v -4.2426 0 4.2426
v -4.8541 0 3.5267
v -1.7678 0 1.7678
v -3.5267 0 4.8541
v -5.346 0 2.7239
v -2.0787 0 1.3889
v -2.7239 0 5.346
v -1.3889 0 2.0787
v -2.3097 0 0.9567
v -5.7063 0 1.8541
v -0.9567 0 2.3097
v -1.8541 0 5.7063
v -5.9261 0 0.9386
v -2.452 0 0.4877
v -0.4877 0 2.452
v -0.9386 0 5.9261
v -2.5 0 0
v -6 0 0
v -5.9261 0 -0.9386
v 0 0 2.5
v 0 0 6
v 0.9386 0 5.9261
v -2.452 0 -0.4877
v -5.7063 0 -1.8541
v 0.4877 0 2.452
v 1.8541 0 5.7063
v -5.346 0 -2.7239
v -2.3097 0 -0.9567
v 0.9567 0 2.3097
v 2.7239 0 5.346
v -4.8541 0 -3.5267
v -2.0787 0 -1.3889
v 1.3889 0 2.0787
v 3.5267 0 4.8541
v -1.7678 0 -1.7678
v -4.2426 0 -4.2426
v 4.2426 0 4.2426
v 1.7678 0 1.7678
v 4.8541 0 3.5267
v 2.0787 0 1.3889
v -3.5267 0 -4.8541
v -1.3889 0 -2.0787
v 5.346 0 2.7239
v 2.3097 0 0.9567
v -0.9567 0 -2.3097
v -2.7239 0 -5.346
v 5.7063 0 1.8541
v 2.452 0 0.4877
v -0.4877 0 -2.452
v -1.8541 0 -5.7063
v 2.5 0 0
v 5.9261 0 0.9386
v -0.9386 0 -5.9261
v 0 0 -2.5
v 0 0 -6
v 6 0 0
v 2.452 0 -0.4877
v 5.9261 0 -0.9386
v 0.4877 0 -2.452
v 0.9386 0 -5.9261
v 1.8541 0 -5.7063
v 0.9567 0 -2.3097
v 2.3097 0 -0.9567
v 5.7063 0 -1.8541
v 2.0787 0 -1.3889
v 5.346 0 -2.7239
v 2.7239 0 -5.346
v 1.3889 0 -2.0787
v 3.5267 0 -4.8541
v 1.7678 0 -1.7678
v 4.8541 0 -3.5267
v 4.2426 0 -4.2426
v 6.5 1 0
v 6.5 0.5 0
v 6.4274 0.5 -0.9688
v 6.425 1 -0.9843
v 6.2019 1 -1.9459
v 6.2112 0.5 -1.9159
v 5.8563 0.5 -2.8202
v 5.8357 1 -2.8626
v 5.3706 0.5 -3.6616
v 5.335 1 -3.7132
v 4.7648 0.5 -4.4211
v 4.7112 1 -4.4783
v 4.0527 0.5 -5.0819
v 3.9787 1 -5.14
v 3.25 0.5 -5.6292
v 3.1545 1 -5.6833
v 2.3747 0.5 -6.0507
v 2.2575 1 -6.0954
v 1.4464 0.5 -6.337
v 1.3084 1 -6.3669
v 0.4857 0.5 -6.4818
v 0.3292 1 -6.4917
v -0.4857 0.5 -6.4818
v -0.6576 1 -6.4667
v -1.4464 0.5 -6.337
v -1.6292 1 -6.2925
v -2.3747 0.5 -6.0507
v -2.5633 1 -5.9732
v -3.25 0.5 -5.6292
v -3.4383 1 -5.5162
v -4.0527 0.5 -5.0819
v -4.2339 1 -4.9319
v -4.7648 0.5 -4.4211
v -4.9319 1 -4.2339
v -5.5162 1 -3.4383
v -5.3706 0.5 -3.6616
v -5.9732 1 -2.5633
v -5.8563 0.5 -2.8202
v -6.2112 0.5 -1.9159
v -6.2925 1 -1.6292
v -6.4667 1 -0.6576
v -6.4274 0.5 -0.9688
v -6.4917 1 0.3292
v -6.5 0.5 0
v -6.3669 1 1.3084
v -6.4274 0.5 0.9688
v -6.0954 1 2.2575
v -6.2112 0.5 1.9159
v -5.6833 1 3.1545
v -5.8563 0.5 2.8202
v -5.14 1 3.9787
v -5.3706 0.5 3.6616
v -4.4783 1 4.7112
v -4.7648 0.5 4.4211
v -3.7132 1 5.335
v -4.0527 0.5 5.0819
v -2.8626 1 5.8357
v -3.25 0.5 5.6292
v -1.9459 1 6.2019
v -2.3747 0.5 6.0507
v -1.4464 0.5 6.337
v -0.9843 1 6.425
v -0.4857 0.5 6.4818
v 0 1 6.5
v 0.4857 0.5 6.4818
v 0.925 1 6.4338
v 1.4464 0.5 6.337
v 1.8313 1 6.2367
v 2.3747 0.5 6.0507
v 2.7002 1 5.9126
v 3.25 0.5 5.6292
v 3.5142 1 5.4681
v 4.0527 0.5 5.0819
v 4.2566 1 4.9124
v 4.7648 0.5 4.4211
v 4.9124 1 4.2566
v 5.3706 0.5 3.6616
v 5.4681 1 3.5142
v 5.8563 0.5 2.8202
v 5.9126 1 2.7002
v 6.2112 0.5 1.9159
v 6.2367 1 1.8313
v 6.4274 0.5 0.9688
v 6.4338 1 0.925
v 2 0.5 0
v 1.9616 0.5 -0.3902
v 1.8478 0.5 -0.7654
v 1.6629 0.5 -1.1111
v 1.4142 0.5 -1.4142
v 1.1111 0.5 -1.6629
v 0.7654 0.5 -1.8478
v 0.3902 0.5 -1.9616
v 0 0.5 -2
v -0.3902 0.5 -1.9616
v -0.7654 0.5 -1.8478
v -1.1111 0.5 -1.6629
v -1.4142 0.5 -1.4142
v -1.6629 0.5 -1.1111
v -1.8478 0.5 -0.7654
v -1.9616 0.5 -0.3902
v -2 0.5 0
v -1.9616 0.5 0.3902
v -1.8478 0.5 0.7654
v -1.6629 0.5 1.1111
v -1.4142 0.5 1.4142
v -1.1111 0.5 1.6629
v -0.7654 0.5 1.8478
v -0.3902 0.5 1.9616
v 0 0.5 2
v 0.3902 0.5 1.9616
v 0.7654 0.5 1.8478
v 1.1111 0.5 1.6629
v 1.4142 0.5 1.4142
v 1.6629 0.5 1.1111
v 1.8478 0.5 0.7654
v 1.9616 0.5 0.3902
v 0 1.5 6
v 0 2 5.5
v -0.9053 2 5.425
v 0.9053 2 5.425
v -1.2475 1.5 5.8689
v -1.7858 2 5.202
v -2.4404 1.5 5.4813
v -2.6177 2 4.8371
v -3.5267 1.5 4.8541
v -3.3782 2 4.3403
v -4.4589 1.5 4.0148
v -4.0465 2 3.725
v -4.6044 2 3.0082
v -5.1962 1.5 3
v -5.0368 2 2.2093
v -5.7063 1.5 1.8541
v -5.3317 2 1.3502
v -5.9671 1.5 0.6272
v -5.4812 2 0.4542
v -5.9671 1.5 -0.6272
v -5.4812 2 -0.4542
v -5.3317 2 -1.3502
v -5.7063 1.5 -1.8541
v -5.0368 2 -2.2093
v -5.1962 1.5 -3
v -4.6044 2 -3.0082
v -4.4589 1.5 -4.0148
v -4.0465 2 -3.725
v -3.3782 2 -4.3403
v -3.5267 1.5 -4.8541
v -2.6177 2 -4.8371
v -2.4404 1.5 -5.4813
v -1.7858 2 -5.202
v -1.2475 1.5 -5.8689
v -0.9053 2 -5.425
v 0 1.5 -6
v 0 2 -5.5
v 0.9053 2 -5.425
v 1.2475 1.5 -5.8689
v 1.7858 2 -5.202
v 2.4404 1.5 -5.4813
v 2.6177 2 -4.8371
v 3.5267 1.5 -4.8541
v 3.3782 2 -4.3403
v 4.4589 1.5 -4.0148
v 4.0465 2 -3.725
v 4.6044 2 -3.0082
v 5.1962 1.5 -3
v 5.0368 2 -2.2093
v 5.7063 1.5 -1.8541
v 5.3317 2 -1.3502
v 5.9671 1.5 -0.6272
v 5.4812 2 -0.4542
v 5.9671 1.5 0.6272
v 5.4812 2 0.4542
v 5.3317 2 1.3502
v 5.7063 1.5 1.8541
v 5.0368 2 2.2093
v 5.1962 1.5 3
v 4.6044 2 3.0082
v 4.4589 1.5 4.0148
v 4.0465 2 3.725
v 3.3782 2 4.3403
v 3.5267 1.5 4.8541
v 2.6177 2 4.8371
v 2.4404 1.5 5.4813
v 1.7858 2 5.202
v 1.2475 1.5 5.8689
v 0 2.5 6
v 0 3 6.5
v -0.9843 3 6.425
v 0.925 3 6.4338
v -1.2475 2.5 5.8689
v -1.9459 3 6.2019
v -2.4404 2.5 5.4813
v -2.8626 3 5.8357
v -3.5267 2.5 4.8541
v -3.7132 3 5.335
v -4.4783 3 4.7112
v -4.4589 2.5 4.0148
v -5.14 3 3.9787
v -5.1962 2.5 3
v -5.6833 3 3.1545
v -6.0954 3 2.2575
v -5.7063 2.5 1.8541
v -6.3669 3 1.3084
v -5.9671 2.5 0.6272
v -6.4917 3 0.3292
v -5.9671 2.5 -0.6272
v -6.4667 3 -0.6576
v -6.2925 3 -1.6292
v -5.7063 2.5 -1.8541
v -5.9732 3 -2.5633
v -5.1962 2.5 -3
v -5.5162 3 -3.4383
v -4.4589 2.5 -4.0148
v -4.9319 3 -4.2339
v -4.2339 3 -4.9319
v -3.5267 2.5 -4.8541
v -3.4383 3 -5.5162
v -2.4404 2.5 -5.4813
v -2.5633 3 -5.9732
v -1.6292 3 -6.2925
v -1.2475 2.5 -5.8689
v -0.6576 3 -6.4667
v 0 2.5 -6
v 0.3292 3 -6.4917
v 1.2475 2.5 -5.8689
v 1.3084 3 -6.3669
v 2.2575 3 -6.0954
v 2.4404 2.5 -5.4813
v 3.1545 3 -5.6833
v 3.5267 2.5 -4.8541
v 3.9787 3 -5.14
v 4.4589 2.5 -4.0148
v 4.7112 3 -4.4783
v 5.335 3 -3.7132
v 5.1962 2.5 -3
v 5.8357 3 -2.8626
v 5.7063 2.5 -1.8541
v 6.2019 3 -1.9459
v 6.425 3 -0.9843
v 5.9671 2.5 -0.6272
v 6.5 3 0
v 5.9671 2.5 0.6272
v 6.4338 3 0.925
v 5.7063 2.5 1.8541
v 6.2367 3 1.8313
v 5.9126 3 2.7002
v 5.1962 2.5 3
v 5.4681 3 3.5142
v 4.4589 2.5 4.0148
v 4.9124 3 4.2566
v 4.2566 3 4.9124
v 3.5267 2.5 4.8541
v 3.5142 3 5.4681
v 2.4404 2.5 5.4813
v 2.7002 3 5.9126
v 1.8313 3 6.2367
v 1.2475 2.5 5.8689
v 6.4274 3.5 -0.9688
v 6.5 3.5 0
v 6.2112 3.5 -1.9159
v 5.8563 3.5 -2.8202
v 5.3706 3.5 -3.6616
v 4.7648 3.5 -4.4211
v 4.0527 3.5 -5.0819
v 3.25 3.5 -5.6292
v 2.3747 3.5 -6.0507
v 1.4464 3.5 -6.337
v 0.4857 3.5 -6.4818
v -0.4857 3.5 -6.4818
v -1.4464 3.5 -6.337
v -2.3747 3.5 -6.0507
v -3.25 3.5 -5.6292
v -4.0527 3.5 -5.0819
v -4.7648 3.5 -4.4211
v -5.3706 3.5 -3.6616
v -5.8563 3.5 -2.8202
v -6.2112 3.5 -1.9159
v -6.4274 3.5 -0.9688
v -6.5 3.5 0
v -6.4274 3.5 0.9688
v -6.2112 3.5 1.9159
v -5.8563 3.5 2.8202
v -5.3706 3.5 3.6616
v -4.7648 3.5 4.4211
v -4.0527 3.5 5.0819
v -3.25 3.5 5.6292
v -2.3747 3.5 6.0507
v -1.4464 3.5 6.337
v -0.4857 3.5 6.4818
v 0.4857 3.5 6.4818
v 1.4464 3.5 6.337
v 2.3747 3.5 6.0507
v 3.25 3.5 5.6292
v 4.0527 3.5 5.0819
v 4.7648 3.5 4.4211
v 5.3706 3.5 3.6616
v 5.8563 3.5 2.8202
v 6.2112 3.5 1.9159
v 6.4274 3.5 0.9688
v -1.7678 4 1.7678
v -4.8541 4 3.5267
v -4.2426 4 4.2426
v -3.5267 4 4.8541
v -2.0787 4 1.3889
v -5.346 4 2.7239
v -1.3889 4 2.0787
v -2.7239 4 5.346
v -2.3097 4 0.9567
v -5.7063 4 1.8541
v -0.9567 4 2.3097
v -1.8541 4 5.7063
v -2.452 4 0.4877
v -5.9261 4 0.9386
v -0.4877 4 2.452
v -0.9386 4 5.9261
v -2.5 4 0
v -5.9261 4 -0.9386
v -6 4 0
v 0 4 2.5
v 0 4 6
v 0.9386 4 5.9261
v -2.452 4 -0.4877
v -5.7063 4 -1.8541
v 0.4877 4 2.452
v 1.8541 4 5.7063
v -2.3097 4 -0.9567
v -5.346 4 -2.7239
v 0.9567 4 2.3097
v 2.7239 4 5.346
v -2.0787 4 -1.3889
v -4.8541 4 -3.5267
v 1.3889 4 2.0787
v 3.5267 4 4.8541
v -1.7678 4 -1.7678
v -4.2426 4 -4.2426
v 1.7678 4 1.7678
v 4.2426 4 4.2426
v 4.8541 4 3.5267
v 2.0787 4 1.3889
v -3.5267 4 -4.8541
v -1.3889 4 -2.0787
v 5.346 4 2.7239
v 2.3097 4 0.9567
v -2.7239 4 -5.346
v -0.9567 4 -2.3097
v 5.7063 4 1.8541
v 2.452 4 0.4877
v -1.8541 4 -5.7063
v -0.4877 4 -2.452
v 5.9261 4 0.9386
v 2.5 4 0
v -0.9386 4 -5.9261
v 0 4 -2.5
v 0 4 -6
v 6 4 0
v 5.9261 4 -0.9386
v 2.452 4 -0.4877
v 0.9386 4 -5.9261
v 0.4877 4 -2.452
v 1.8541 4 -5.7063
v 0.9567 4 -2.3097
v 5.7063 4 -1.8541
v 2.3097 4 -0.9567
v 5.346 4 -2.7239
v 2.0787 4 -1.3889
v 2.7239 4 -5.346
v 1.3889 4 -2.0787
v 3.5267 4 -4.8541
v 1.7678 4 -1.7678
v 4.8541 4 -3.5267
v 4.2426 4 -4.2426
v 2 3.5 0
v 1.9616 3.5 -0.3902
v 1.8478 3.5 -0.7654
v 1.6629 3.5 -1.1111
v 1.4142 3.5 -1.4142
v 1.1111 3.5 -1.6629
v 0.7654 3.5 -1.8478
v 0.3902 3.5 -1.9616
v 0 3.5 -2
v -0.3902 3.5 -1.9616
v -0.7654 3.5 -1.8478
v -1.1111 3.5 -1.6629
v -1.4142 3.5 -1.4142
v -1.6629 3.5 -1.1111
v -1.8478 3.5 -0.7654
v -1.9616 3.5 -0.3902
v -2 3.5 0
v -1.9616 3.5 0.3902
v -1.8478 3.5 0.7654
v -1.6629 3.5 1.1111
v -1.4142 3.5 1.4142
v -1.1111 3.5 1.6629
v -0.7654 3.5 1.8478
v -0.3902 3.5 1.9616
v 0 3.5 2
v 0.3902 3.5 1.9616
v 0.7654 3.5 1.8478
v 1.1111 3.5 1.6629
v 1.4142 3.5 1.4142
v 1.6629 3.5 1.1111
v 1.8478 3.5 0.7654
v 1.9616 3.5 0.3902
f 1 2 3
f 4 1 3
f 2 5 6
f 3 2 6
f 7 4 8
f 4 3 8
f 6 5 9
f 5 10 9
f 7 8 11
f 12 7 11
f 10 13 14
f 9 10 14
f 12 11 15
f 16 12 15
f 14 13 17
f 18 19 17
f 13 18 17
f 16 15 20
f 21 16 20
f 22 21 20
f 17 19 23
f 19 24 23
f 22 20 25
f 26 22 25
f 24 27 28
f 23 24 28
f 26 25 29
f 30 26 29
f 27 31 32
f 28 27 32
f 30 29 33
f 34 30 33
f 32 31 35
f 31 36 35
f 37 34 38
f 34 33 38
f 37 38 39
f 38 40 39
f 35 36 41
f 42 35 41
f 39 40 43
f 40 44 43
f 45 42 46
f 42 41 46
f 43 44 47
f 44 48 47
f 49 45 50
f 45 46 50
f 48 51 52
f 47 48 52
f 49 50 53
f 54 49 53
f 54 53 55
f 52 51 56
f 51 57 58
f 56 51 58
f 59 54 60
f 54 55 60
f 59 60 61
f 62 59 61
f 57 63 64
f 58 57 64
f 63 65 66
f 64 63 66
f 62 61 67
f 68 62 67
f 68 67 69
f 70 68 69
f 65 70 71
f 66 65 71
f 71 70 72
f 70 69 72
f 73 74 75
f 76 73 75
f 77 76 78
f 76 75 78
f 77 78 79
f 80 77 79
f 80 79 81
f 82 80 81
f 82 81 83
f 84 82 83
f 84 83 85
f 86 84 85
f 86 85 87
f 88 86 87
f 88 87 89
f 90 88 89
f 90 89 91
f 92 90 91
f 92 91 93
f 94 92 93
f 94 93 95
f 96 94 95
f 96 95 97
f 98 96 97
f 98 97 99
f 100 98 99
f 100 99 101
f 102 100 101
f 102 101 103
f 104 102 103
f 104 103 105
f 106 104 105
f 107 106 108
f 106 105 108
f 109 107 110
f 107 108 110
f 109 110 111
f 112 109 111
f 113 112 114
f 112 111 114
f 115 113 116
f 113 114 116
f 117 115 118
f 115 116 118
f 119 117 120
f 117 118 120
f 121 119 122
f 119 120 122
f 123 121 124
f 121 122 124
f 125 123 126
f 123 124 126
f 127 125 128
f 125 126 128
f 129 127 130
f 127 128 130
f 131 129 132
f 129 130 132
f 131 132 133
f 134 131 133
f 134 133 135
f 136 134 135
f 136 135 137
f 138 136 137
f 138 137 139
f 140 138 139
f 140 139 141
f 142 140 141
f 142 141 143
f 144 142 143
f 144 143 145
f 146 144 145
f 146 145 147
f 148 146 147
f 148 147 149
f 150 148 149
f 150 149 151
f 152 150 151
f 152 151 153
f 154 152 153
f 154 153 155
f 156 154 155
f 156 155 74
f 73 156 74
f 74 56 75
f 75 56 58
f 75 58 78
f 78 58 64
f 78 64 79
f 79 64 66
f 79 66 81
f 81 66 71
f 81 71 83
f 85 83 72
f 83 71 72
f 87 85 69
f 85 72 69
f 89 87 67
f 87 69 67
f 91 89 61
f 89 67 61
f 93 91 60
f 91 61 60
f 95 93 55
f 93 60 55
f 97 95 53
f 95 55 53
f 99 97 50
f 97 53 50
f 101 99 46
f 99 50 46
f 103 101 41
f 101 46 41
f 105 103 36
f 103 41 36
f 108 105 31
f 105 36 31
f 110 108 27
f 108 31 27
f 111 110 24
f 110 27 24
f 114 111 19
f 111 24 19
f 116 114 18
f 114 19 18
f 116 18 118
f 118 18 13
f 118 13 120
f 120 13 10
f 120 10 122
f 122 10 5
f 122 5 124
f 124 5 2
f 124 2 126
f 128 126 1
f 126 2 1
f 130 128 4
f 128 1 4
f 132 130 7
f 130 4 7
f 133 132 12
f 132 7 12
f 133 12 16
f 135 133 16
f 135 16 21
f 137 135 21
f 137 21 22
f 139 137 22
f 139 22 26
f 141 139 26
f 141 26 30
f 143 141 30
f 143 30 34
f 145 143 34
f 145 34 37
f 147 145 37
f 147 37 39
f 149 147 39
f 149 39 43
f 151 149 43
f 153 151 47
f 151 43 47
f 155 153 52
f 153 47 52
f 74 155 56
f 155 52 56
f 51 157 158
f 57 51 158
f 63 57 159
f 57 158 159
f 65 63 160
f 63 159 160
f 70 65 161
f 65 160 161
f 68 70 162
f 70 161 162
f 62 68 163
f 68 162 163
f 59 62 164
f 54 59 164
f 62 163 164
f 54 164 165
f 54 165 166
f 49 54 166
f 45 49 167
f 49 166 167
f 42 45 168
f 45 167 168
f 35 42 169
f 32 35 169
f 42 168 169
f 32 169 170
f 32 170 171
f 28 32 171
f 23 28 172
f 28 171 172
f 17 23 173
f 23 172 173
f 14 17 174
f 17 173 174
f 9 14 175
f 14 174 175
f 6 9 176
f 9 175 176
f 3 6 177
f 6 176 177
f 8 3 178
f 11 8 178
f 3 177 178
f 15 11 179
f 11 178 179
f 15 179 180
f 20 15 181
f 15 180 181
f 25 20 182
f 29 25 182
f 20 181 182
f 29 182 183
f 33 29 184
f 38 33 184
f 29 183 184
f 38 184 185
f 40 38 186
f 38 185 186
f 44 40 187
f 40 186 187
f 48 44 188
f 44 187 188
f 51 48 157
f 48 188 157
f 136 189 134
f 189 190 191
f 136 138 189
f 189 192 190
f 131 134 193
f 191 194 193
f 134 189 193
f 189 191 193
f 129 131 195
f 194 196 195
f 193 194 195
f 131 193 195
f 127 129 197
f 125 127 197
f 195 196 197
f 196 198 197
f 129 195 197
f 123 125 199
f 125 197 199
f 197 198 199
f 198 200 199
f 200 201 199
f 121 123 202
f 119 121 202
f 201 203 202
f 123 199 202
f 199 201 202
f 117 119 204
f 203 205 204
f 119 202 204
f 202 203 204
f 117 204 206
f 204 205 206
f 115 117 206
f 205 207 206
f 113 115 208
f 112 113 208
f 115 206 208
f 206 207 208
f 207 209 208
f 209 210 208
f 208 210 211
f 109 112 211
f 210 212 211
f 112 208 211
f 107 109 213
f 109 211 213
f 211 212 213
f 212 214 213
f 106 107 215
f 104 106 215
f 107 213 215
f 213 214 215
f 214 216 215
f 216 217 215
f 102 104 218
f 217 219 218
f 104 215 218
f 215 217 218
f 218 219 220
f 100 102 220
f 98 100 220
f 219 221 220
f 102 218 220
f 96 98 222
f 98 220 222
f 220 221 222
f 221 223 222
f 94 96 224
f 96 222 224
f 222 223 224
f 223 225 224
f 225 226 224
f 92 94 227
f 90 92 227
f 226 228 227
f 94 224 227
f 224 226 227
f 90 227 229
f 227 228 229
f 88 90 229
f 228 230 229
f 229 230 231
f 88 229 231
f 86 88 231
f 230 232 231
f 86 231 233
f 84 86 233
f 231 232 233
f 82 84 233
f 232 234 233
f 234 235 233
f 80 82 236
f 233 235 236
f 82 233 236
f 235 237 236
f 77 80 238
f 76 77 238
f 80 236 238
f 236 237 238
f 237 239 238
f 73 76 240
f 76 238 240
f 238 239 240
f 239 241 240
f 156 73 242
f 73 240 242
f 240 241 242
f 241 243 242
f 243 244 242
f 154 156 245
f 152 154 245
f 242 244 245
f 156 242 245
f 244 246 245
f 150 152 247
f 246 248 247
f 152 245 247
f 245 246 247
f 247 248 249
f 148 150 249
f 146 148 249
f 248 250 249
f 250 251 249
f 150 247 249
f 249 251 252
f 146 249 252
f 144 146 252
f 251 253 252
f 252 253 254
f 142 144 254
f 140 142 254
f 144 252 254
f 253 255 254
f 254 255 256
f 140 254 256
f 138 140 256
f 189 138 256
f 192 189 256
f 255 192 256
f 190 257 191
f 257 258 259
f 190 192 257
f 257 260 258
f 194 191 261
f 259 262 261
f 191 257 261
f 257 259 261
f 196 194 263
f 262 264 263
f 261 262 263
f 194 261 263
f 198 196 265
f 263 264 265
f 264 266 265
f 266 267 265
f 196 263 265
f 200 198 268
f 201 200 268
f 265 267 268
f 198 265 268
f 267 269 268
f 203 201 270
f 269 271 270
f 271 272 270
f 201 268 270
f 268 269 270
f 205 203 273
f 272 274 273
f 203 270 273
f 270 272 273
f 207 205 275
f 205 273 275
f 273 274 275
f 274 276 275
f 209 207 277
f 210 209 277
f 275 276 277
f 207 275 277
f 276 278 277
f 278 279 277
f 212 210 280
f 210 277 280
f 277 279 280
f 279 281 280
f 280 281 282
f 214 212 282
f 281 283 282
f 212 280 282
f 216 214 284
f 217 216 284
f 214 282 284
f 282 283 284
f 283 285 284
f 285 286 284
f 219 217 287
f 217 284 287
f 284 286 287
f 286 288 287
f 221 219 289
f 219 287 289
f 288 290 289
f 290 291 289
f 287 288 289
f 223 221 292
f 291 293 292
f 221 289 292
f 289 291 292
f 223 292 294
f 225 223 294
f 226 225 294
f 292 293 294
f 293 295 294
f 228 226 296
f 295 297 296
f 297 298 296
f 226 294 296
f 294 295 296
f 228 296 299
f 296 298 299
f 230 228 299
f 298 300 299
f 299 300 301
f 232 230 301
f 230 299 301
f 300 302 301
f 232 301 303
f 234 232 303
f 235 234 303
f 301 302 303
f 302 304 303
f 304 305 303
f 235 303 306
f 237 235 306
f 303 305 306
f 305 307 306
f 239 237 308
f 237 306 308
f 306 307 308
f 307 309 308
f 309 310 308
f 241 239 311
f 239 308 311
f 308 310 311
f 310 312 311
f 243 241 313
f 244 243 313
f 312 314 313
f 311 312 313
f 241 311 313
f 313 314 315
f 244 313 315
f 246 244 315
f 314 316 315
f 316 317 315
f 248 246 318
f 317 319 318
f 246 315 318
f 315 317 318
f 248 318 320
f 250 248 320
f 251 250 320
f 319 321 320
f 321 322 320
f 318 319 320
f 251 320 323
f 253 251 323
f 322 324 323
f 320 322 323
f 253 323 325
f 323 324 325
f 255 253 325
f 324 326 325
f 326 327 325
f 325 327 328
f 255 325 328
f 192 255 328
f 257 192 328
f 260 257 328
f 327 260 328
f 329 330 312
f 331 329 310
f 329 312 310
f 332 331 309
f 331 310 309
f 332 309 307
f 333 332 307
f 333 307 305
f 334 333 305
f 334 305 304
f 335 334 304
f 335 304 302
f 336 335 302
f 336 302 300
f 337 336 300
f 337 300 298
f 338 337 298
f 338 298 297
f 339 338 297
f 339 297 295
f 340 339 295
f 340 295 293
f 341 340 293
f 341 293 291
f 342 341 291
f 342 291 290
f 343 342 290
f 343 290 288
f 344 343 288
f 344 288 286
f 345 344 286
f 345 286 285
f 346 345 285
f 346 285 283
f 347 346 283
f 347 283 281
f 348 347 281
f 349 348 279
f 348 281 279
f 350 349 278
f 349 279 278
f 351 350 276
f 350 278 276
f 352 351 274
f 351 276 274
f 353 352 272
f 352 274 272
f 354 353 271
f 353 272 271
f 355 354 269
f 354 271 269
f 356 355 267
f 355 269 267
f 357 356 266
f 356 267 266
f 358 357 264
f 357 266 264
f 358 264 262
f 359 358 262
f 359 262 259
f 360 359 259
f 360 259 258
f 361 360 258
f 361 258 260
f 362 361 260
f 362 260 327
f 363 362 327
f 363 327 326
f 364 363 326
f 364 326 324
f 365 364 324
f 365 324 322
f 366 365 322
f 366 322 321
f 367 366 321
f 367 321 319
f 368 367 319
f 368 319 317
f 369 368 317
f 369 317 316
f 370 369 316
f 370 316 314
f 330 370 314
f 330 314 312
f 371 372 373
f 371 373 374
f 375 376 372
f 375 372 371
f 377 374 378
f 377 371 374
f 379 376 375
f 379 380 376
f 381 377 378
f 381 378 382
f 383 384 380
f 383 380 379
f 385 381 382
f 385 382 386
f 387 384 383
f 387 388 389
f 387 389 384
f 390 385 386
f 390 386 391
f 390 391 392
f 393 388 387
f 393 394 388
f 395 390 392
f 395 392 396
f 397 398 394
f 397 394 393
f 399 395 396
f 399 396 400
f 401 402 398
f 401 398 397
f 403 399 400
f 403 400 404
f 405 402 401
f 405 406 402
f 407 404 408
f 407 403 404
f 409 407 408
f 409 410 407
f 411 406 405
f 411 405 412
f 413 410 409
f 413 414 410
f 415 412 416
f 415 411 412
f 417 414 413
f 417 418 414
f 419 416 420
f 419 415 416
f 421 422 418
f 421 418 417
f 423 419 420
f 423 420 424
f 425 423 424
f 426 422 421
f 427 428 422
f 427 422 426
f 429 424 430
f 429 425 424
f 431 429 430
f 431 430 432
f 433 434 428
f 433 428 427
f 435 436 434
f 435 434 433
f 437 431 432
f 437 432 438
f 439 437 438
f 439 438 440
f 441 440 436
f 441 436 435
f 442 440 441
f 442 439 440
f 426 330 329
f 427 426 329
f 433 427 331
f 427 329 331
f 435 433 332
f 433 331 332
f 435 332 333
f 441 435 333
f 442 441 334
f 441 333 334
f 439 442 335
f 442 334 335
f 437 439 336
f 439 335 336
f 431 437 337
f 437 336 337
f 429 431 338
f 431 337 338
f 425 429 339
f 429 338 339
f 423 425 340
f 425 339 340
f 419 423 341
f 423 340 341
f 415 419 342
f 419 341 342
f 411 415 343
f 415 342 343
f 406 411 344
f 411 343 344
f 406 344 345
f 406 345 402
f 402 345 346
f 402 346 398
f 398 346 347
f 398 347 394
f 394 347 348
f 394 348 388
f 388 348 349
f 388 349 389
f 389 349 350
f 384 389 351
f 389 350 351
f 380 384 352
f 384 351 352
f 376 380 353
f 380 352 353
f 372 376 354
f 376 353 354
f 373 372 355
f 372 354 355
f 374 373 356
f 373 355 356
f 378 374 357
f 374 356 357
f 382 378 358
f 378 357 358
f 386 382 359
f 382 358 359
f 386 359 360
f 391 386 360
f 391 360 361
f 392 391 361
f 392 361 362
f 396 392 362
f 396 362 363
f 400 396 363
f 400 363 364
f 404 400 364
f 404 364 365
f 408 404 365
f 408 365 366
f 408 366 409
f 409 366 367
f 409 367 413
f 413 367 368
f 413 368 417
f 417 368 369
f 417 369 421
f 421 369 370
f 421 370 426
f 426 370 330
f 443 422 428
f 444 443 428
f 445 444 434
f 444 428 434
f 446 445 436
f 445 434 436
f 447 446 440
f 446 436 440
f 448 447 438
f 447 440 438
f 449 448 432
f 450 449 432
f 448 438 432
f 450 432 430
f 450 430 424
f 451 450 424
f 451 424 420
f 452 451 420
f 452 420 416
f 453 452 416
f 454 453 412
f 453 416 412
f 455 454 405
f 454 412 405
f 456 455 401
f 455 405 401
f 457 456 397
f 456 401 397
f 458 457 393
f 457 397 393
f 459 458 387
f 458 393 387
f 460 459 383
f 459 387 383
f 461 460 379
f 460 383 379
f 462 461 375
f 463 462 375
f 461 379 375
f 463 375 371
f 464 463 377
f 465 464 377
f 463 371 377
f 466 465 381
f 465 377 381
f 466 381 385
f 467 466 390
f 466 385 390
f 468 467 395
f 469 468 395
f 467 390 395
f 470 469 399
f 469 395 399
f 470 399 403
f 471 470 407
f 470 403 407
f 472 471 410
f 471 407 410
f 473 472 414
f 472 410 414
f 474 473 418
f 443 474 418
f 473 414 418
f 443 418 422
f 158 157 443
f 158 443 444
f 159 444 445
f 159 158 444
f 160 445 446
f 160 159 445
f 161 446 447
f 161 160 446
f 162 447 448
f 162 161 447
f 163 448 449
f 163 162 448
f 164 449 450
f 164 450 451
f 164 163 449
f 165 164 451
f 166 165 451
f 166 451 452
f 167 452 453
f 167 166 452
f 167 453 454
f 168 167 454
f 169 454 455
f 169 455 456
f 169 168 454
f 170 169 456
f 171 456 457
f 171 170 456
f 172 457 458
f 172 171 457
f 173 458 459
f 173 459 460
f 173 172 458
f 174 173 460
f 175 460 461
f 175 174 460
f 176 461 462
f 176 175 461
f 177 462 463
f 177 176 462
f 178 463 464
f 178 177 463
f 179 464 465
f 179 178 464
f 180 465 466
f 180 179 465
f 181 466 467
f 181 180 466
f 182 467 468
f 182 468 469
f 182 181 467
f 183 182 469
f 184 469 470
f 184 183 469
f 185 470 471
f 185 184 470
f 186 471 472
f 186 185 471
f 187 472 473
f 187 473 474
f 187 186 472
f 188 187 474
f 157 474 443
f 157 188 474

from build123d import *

# Parameters (mm, degrees)
SKETCH1_R           = 6.5
SKETCH1_R_2         = 2
BOSS_EXTRUDE1_DEPTH = 4
CHAMFER1_SIZE       = 0.5


with BuildPart() as part:
    # Sketch1 → Boss-Extrude1 (new body)
    with BuildSketch(Plane(origin=(0, 0, 0), x_dir=(1, 0, 0), z_dir=(0, 1, 0))):
        Circle(SKETCH1_R)
        Circle(SKETCH1_R_2, mode=Mode.SUBTRACT)
    extrude(amount=BOSS_EXTRUDE1_DEPTH)

    # Sketch2 → Cut-Revolve1 (revolve, cut)
    with BuildSketch(Plane(origin=(0, 0, 0), x_dir=(0, 0, -1), z_dir=(1, 0, 0))):
        Polygon((-6.5, 3), (-6.5, 1), (-5.5, 2), align=None)
    revolve(axis=Axis((0, 4, 0), (0, -1, 0)), mode=Mode.SUBTRACT)

    # Chamfer1
    chamfer1_edges = [part.edges().sort_by_distance(p)[0] for p in [
        (-6.5, 0, 0),
        (-6.5, 4, 0),
        (-2, 0, 0),
        (-2, 4, 0),
    ]]
    chamfer(chamfer1_edges, length=CHAMFER1_SIZE)


solid = part.part
